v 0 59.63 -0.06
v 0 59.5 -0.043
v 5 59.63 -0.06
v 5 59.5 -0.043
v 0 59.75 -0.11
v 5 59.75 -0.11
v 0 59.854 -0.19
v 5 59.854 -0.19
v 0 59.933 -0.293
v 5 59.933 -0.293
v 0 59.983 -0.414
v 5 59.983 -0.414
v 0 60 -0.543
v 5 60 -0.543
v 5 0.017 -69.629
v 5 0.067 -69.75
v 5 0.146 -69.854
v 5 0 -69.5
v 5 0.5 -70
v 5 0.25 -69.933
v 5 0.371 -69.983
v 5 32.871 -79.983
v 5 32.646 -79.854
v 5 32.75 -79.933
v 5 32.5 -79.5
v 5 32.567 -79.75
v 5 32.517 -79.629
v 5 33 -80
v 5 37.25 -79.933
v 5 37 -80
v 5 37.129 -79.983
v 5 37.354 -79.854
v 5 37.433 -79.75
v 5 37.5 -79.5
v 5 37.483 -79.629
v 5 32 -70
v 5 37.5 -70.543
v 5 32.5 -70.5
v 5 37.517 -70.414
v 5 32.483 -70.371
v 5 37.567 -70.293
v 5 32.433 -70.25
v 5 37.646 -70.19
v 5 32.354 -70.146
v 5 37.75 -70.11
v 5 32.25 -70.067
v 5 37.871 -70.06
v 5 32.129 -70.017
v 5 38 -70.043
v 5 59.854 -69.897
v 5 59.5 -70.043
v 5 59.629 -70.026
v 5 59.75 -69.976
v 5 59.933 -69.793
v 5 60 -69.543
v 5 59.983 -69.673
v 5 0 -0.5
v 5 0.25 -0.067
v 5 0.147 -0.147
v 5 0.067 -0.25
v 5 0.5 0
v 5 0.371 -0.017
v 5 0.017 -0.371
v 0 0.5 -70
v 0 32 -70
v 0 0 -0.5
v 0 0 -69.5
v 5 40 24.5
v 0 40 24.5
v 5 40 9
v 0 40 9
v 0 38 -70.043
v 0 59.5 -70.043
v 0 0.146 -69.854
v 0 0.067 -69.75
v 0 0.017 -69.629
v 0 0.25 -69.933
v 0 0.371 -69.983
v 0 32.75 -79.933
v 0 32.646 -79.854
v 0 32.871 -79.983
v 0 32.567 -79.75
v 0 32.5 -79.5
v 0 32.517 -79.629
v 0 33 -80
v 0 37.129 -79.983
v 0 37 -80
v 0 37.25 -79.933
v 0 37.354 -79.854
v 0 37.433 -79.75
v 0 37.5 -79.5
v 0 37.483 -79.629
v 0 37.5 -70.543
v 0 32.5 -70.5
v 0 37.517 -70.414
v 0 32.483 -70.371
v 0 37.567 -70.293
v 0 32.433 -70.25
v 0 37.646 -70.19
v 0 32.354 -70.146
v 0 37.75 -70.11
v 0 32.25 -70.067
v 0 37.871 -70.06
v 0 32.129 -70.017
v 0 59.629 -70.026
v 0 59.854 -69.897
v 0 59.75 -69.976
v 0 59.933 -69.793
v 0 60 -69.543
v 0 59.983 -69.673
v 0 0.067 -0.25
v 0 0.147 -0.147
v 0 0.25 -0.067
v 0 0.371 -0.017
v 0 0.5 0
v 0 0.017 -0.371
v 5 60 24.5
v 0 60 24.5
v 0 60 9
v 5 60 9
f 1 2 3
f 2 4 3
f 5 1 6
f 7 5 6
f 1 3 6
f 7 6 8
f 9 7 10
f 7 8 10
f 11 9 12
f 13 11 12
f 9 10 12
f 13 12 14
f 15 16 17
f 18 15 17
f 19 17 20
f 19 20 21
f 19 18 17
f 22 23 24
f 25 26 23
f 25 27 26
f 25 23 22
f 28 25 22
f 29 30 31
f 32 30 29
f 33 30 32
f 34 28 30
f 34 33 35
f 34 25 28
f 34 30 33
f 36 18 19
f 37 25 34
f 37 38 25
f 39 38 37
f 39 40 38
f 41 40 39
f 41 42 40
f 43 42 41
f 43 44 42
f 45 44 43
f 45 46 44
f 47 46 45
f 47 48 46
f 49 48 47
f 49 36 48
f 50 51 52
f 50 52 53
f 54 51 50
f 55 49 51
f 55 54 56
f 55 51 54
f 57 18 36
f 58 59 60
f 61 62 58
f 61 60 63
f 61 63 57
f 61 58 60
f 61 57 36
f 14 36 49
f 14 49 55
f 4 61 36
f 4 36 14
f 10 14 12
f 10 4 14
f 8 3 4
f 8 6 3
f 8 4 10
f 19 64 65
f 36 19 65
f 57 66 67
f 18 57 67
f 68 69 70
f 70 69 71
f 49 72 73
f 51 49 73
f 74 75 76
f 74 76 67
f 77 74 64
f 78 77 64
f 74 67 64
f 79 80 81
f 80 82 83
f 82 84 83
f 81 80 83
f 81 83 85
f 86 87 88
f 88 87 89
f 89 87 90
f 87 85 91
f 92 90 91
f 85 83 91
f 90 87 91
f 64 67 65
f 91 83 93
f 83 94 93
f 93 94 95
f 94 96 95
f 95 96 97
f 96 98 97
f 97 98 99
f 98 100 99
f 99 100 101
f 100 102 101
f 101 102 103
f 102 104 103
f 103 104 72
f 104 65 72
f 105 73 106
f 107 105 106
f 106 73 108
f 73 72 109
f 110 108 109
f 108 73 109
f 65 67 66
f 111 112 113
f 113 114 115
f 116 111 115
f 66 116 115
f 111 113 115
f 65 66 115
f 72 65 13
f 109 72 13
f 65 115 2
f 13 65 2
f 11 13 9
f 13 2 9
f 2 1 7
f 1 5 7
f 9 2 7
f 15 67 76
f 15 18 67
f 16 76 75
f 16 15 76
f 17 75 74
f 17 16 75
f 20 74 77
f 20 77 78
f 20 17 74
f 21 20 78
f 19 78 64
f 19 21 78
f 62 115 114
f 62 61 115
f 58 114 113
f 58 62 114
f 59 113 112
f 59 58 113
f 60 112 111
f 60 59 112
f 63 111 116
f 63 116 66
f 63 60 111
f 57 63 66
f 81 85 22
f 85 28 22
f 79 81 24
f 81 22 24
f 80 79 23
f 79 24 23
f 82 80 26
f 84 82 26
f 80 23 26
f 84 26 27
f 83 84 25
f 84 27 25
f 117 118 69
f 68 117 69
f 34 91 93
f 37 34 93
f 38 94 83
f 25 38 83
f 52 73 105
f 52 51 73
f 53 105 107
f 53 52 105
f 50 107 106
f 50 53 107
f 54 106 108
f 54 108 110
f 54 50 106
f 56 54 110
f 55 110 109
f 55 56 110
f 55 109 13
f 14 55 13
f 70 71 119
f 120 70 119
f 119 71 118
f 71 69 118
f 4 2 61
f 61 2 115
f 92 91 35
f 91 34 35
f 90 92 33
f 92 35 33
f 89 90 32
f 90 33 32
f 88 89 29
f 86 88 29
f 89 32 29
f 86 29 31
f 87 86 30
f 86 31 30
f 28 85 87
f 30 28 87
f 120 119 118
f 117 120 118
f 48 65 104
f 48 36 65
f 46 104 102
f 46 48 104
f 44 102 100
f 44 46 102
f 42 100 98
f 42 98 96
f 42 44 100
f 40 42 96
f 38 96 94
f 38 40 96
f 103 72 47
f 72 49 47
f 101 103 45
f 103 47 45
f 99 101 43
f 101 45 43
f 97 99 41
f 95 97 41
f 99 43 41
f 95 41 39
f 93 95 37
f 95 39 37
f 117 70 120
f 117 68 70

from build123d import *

# Parameters (mm, degrees)
F1_DEPTH = 5
F2_R     = 0.5
F3_R     = 0.5
F4_R     = 0.5


# Not quite as in the source:
# - a feature names something its author has since deleted; it is built from what else it names


with BuildPart() as f1:
    # F0 (on Right) → F1 (new body)
    with BuildSketch(Plane.YZ):
        Polygon((60, -0.0434386059), (0, 0), (0, -70), (12, -70), (12.4011761725, -70), (32.5, -70), (32.5, -80), (37.5, -80), (37.5, -70.0434386059), (60, -70.0434386059), align=None)
    extrude(amount=F1_DEPTH)

    # F2
    f2_edges = [f1.edges().sort_by_distance(p)[0] for p in [
        (2.5, 0, 0),
        (2.5, 0, -70),
        (2.5, 60, -70.043439),
        (2.5, 60, -0.043439),
    ]]
    fillet(f2_edges, radius=F2_R)

    # F3
    f3_edges = [f1.edges().sort_by_distance(p)[0] for p in [
        (2.5, 37.5, -70.043439),
        (2.5, 32.5, -70),
    ]]
    fillet(f3_edges, radius=F3_R)

    # F4
    f4_edges = [f1.edges().sort_by_distance(p)[0] for p in [
        (2.5, 32.5, -80),
        (2.5, 37.5, -80),
    ]]
    fillet(f4_edges, radius=F4_R)


with BuildPart() as f1b:
    # F0 (on Right) → F1, piece 2 (new body)
    with BuildSketch(Plane.YZ):
        Polygon((40, 8.9999613941), (42.5, 8.9999613941), (60, 8.9999613941), (60, 24.499980697), (42.5, 24.499980697), (40, 24.499980697), align=None)
    extrude(amount=F1_DEPTH)


solid = Compound([f1.part, f1b.part])
